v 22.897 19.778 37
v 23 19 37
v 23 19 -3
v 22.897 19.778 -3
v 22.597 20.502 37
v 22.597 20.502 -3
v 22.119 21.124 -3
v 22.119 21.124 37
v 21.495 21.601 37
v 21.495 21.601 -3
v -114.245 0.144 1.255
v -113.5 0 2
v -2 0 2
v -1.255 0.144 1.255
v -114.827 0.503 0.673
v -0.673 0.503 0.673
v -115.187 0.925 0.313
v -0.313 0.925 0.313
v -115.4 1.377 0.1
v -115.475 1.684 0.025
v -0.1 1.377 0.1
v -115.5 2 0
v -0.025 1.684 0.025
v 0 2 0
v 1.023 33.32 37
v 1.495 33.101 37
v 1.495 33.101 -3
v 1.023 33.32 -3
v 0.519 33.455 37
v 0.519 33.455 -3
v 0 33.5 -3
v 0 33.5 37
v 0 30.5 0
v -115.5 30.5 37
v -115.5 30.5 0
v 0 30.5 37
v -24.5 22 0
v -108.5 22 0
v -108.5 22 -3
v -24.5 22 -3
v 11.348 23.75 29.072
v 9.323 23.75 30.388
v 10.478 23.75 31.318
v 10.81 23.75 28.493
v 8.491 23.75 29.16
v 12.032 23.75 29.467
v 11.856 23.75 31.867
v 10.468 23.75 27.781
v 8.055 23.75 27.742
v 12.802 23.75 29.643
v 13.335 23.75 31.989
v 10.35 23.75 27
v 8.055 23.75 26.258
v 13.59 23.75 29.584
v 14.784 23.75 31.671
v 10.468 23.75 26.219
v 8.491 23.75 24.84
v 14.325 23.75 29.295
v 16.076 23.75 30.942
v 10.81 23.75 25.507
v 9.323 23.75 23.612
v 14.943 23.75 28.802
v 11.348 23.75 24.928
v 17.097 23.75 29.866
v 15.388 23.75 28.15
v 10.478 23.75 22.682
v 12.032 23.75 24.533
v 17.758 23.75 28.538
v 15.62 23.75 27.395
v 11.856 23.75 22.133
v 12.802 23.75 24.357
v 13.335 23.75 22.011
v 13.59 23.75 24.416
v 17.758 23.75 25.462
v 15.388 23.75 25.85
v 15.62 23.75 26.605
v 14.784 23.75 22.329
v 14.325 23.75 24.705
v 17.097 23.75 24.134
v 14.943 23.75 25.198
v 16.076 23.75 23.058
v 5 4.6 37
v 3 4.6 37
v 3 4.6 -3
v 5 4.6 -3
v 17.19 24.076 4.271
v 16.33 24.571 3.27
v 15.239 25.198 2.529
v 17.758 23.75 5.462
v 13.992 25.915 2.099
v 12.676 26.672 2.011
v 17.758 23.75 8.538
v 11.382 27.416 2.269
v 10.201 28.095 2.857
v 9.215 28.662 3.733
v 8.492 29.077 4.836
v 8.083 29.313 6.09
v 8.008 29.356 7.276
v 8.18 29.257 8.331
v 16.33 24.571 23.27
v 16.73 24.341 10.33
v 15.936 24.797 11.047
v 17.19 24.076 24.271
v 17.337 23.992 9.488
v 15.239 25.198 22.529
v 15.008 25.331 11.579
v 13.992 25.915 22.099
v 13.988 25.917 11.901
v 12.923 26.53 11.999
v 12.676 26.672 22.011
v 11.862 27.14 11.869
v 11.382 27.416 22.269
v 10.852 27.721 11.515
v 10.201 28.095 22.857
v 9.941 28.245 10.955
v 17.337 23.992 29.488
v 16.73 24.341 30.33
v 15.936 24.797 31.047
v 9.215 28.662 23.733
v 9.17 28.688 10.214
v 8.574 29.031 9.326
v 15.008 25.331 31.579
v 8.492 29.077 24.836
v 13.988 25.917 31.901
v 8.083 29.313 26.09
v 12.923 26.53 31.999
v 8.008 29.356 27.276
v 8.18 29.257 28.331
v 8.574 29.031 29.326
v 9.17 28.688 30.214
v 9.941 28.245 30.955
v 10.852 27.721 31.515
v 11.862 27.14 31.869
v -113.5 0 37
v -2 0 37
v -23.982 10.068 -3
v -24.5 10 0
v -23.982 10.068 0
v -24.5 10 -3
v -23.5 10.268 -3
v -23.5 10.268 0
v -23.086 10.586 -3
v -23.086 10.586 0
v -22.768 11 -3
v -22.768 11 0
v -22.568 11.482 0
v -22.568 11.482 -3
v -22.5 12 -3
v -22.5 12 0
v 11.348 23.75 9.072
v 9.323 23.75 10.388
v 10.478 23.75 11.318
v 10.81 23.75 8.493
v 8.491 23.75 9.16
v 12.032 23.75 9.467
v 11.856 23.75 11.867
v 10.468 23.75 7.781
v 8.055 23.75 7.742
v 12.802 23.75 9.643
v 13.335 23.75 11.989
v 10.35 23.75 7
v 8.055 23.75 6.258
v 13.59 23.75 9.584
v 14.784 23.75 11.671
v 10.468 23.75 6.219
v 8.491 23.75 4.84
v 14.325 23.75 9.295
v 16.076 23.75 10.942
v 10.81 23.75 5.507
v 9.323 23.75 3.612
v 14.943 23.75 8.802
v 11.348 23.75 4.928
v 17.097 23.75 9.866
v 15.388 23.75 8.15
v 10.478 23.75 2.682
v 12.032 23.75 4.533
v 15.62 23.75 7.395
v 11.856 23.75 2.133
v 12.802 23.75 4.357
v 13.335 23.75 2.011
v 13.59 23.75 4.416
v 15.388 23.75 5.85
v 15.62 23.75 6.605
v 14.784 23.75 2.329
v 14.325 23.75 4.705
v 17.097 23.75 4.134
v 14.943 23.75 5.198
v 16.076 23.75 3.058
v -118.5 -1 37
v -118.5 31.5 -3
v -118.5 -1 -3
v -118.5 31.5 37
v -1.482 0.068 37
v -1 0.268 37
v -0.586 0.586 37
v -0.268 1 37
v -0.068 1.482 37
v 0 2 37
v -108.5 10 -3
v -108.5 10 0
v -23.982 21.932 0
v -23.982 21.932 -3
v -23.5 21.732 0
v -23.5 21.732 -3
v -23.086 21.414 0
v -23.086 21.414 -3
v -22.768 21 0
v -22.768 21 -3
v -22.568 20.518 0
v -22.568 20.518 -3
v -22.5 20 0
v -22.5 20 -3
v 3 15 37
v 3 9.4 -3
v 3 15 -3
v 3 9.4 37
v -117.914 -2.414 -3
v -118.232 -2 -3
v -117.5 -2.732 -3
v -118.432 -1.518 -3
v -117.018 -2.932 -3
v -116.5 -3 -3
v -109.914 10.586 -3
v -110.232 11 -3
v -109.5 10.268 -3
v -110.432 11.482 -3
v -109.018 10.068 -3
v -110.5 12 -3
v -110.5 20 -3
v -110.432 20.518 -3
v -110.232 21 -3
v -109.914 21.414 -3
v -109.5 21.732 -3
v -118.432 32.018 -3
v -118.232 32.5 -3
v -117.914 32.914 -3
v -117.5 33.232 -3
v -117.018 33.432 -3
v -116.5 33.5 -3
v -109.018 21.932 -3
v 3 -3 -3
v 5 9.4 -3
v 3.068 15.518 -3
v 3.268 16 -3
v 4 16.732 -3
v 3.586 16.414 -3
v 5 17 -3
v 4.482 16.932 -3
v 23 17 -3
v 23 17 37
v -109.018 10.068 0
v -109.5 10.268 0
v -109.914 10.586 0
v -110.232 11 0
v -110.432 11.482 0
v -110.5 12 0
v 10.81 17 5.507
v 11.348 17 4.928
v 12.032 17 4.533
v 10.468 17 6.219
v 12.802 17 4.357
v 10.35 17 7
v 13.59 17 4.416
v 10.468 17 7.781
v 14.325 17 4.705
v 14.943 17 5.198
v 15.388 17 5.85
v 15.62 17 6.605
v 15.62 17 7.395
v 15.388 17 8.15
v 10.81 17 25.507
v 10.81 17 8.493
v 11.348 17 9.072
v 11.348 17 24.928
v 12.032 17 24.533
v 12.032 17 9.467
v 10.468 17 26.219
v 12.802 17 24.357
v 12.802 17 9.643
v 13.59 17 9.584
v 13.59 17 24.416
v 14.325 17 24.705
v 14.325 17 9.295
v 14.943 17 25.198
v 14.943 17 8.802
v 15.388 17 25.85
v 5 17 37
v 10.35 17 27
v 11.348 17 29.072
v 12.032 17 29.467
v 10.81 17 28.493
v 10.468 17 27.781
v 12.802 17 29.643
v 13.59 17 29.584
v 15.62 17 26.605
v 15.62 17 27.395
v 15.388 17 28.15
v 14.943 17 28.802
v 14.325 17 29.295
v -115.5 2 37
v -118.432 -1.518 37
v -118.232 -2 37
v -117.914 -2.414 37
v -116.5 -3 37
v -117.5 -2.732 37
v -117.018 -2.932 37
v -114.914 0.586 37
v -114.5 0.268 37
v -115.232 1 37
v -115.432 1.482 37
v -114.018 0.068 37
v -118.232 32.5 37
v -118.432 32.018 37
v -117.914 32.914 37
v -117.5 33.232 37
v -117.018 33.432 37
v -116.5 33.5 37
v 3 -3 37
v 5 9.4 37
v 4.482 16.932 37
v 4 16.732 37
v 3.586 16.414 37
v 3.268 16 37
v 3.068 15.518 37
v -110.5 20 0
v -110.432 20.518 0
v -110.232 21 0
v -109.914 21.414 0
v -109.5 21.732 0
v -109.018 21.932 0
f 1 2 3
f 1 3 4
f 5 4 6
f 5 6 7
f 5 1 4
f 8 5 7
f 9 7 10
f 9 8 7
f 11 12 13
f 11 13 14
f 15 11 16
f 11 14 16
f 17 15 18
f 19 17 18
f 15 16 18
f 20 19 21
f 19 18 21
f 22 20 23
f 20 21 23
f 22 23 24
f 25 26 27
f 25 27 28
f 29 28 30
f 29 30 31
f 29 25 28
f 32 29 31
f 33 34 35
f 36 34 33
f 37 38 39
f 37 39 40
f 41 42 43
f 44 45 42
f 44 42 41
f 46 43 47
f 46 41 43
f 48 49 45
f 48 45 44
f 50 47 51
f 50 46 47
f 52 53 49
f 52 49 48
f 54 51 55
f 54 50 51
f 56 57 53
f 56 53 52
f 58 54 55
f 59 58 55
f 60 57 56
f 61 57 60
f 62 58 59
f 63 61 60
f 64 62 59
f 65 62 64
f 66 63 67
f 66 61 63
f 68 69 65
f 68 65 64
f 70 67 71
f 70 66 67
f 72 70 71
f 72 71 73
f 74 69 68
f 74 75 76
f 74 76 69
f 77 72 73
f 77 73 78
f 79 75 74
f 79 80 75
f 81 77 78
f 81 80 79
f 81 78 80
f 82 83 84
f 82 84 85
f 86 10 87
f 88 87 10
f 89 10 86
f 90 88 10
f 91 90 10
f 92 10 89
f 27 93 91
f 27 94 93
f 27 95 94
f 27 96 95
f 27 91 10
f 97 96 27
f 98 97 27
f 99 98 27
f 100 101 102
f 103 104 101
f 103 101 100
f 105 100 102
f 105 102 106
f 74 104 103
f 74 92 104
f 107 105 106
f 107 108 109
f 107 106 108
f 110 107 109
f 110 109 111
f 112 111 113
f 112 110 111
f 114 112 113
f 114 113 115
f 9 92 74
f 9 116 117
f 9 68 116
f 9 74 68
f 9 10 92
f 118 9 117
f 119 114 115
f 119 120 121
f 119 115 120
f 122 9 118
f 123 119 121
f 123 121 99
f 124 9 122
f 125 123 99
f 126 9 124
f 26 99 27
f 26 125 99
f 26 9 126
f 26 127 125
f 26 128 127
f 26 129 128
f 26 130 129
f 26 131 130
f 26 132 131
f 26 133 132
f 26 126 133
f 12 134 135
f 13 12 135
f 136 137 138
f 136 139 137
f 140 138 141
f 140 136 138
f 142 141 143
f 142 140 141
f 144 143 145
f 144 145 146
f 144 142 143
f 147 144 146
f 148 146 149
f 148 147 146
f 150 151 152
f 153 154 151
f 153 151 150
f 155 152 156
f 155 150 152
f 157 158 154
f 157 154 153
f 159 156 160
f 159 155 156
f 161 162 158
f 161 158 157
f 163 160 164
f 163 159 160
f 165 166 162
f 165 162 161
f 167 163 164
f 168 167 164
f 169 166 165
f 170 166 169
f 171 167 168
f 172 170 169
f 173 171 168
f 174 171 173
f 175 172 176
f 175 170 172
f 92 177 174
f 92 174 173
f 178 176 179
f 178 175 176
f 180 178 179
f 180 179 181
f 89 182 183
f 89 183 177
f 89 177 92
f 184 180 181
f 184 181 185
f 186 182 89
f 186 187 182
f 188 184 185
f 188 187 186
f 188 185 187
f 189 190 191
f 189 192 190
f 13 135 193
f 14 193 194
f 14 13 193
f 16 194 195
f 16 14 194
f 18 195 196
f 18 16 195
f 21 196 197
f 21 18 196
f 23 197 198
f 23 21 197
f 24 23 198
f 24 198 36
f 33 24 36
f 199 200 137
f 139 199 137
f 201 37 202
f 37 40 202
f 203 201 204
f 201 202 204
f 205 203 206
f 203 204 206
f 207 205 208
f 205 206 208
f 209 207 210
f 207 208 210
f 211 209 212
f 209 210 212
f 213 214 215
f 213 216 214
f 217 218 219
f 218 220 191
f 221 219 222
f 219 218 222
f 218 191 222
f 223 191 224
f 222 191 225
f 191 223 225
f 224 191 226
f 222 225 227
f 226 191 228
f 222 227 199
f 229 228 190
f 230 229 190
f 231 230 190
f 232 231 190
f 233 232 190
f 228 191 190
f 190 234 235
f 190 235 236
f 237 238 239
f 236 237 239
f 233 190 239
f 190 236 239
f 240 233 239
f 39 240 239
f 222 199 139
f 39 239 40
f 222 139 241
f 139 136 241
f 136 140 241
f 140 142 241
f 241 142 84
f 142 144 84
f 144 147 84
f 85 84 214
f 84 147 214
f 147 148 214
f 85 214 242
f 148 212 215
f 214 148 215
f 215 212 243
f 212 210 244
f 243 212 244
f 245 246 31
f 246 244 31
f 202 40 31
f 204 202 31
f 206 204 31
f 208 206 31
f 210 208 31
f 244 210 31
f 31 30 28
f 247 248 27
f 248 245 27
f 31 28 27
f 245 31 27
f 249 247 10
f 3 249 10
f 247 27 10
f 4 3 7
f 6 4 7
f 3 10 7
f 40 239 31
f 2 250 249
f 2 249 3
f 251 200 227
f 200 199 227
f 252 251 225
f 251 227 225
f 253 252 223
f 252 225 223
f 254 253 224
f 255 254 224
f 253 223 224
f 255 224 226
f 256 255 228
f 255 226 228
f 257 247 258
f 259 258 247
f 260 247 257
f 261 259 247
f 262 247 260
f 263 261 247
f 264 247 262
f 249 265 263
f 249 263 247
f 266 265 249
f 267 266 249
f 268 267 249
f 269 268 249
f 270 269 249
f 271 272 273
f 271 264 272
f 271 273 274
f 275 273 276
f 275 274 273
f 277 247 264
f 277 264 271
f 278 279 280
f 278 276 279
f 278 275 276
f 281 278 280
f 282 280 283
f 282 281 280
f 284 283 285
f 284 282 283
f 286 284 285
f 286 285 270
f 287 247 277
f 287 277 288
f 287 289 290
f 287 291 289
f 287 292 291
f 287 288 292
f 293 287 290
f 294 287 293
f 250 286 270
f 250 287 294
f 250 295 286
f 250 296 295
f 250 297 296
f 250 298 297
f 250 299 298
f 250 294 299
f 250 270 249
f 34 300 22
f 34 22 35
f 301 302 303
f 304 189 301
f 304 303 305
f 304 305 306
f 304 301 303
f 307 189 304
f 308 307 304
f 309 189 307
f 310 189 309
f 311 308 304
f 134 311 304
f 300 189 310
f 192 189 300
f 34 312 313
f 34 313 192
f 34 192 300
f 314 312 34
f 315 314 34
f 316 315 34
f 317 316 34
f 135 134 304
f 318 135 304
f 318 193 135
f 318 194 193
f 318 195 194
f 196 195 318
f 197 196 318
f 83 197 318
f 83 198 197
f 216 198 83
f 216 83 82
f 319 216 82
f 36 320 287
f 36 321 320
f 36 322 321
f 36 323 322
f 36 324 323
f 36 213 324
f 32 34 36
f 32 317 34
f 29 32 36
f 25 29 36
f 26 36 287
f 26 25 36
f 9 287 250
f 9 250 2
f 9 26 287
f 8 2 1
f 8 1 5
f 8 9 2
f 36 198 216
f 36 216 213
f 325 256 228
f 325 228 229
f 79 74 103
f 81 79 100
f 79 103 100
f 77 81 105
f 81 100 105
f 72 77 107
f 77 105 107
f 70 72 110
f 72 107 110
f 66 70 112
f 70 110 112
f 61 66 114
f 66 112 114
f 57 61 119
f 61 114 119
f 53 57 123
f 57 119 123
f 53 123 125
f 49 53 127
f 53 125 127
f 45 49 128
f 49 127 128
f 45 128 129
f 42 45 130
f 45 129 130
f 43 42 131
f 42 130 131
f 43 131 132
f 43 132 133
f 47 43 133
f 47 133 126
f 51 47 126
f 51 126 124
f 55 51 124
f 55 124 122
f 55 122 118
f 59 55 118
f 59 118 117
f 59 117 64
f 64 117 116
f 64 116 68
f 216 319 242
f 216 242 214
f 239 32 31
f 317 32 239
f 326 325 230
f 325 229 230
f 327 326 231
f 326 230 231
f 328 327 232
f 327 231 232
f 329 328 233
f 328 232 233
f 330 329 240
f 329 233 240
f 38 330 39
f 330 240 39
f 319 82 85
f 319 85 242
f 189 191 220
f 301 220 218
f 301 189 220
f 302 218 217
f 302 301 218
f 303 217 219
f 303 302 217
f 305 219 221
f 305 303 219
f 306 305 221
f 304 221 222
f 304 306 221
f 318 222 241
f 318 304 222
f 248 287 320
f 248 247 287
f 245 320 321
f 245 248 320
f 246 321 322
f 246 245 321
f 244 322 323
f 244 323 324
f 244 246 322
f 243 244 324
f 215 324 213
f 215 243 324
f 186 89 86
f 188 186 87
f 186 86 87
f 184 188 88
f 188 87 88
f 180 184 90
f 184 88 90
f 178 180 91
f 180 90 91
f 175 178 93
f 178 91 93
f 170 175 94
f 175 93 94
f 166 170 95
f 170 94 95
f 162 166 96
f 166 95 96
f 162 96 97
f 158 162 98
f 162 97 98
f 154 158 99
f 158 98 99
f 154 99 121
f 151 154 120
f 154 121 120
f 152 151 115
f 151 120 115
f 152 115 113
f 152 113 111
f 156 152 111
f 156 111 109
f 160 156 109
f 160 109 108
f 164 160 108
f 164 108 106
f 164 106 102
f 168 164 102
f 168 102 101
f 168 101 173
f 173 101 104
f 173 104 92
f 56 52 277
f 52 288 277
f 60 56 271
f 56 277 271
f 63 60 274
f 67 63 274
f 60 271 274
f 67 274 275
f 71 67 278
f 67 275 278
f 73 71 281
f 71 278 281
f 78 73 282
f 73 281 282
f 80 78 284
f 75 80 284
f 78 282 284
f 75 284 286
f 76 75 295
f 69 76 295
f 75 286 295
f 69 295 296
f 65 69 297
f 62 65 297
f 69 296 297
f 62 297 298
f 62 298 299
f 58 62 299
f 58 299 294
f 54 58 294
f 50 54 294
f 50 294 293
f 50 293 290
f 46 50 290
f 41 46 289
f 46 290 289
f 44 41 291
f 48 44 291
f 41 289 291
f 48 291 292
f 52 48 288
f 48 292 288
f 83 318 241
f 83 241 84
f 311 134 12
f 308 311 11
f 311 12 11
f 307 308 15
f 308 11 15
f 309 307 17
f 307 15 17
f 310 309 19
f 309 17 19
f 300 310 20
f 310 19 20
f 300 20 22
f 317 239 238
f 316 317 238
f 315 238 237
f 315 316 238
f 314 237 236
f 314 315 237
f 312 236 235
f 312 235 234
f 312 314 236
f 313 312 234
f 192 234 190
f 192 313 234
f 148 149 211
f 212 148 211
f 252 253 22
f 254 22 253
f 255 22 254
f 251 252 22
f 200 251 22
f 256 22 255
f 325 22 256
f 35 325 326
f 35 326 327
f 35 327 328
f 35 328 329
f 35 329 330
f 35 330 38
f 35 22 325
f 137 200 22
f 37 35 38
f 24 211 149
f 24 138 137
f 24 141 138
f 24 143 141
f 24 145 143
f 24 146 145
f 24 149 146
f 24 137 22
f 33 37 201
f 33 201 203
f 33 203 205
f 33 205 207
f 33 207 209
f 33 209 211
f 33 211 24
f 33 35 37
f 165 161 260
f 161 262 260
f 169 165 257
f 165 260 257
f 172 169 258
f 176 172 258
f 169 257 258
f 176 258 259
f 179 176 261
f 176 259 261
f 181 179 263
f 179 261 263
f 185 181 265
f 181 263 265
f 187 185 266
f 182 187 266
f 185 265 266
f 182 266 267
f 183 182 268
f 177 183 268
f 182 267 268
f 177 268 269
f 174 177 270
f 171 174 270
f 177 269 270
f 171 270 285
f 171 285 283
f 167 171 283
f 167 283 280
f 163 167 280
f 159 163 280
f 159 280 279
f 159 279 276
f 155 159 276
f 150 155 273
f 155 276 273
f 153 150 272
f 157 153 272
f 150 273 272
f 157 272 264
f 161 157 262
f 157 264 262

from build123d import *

# Parameters (mm, degrees)
SKETCH1_W                      = 115.5
SKETCH1_H                      = 30.5
SKETCH1_W_2                    = 88
SKETCH1_H_2                    = 12
BOSS_EXTRUDE1_DEPTH            = 3
BOSS_EXTRUDE2_START            = 37
SKETCH1_3_W                    = 115.5
SKETCH1_3_H                    = 30.5
BOSS_EXTRUDE2_DEPTH            = 37
CBORE_FOR_M5_SHCS1_D           = 5.3
CBORE_FOR_M5_SHCS1_CBORE_D     = 10
CBORE_FOR_M5_SHCS1_CBORE_DEPTH = 9.75
FILLET1_R                      = 2


with BuildPart() as part:
    # Sketch1 → Boss-Extrude1 (new body)
    # profile 1 of 2: a face of its own
    with BuildSketch(Plane.XY):
        with BuildLine():
            Line((23, 17), (23, 19))
            ThreePointArc((23, 19), (22.596751829, 20.502291563), (21.495413373, 21.600718909))
            Line((21.495413373, 21.600718909), (1.495413373, 33.100718909))
            ThreePointArc((1.495413373, 33.100718909), (0.773900275, 33.398461379), (0, 33.5))
            Line((0, 33.5), (-118.5, 33.5))
            Line((-118.5, 33.5), (-118.5, -3))
            Line((-118.5, -3), (3, -3))
            Line((3, -3), (3, 4.6))
            Line((3, 4.6), (5, 4.6))
            Line((5, 4.6), (5, 9.4))
            Line((5, 9.4), (3, 9.4))
            Line((3, 9.4), (3, 17))
            Line((3, 17), (23, 17))
        make_face()
        with Locations((-57.75, 15.25)):
            Rectangle(SKETCH1_W, SKETCH1_H, mode=Mode.SUBTRACT)
    # profile 2 of 2: a face of its own
    with BuildSketch(Plane.XY):
        with Locations((-57.75, 15.25)):
            Rectangle(SKETCH1_W, SKETCH1_H)
        with Locations((-66.5, 16)):
            Rectangle(SKETCH1_W_2, SKETCH1_H_2, mode=Mode.SUBTRACT)
    extrude(amount=-BOSS_EXTRUDE1_DEPTH)

    # Sketch1<3> → Boss-Extrude2 (add)
    with BuildSketch(Plane.XY.offset(BOSS_EXTRUDE2_START)):
        with BuildLine():
            Line((23, 17), (23, 19))
            ThreePointArc((23, 19), (22.596751829, 20.502291563), (21.495413373, 21.600718909))
            Line((21.495413373, 21.600718909), (1.495413373, 33.100718909))
            ThreePointArc((1.495413373, 33.100718909), (0.773900275, 33.398461379), (0, 33.5))
            Line((0, 33.5), (-118.5, 33.5))
            Line((-118.5, 33.5), (-118.5, -3))
            Line((-118.5, -3), (3, -3))
            Line((3, -3), (3, 4.6))
            Line((3, 4.6), (5, 4.6))
            Line((5, 4.6), (5, 9.4))
            Line((5, 9.4), (3, 9.4))
            Line((3, 9.4), (3, 17))
            Line((3, 17), (23, 17))
        make_face()
        with Locations((-57.75, 15.25)):
            Rectangle(SKETCH1_3_W, SKETCH1_3_H, mode=Mode.SUBTRACT)
    extrude(amount=-BOSS_EXTRUDE2_DEPTH)

    # CBORE for M5 SHCS1 (through all)
    with Locations(Plane(origin=(0, 33.5, 0), x_dir=(1, 0, 0), z_dir=(0, 1, 0))):
        with Locations((13, -27), (13, -7)):
            CounterBoreHole(CBORE_FOR_M5_SHCS1_D / 2, CBORE_FOR_M5_SHCS1_CBORE_D / 2, CBORE_FOR_M5_SHCS1_CBORE_DEPTH)

    # Fillet1
    fillet1_edges = [part.edges().sort_by_distance(p)[0] for p in [
        (-22.5, 22, -1.5),
        (-110.5, 22, -1.5),
        (-110.5, 10, -1.5),
        (-22.5, 10, -1.5),
        (3, 17, 17),
        (-118.5, -3, 17),
        (-118.5, 33.5, 17),
        (0, 0, 18.5),
        (-57.75, 0, 0),
        (-115.5, 0, 18.5),
    ]]
    fillet(fillet1_edges, radius=FILLET1_R)


solid = part.part
